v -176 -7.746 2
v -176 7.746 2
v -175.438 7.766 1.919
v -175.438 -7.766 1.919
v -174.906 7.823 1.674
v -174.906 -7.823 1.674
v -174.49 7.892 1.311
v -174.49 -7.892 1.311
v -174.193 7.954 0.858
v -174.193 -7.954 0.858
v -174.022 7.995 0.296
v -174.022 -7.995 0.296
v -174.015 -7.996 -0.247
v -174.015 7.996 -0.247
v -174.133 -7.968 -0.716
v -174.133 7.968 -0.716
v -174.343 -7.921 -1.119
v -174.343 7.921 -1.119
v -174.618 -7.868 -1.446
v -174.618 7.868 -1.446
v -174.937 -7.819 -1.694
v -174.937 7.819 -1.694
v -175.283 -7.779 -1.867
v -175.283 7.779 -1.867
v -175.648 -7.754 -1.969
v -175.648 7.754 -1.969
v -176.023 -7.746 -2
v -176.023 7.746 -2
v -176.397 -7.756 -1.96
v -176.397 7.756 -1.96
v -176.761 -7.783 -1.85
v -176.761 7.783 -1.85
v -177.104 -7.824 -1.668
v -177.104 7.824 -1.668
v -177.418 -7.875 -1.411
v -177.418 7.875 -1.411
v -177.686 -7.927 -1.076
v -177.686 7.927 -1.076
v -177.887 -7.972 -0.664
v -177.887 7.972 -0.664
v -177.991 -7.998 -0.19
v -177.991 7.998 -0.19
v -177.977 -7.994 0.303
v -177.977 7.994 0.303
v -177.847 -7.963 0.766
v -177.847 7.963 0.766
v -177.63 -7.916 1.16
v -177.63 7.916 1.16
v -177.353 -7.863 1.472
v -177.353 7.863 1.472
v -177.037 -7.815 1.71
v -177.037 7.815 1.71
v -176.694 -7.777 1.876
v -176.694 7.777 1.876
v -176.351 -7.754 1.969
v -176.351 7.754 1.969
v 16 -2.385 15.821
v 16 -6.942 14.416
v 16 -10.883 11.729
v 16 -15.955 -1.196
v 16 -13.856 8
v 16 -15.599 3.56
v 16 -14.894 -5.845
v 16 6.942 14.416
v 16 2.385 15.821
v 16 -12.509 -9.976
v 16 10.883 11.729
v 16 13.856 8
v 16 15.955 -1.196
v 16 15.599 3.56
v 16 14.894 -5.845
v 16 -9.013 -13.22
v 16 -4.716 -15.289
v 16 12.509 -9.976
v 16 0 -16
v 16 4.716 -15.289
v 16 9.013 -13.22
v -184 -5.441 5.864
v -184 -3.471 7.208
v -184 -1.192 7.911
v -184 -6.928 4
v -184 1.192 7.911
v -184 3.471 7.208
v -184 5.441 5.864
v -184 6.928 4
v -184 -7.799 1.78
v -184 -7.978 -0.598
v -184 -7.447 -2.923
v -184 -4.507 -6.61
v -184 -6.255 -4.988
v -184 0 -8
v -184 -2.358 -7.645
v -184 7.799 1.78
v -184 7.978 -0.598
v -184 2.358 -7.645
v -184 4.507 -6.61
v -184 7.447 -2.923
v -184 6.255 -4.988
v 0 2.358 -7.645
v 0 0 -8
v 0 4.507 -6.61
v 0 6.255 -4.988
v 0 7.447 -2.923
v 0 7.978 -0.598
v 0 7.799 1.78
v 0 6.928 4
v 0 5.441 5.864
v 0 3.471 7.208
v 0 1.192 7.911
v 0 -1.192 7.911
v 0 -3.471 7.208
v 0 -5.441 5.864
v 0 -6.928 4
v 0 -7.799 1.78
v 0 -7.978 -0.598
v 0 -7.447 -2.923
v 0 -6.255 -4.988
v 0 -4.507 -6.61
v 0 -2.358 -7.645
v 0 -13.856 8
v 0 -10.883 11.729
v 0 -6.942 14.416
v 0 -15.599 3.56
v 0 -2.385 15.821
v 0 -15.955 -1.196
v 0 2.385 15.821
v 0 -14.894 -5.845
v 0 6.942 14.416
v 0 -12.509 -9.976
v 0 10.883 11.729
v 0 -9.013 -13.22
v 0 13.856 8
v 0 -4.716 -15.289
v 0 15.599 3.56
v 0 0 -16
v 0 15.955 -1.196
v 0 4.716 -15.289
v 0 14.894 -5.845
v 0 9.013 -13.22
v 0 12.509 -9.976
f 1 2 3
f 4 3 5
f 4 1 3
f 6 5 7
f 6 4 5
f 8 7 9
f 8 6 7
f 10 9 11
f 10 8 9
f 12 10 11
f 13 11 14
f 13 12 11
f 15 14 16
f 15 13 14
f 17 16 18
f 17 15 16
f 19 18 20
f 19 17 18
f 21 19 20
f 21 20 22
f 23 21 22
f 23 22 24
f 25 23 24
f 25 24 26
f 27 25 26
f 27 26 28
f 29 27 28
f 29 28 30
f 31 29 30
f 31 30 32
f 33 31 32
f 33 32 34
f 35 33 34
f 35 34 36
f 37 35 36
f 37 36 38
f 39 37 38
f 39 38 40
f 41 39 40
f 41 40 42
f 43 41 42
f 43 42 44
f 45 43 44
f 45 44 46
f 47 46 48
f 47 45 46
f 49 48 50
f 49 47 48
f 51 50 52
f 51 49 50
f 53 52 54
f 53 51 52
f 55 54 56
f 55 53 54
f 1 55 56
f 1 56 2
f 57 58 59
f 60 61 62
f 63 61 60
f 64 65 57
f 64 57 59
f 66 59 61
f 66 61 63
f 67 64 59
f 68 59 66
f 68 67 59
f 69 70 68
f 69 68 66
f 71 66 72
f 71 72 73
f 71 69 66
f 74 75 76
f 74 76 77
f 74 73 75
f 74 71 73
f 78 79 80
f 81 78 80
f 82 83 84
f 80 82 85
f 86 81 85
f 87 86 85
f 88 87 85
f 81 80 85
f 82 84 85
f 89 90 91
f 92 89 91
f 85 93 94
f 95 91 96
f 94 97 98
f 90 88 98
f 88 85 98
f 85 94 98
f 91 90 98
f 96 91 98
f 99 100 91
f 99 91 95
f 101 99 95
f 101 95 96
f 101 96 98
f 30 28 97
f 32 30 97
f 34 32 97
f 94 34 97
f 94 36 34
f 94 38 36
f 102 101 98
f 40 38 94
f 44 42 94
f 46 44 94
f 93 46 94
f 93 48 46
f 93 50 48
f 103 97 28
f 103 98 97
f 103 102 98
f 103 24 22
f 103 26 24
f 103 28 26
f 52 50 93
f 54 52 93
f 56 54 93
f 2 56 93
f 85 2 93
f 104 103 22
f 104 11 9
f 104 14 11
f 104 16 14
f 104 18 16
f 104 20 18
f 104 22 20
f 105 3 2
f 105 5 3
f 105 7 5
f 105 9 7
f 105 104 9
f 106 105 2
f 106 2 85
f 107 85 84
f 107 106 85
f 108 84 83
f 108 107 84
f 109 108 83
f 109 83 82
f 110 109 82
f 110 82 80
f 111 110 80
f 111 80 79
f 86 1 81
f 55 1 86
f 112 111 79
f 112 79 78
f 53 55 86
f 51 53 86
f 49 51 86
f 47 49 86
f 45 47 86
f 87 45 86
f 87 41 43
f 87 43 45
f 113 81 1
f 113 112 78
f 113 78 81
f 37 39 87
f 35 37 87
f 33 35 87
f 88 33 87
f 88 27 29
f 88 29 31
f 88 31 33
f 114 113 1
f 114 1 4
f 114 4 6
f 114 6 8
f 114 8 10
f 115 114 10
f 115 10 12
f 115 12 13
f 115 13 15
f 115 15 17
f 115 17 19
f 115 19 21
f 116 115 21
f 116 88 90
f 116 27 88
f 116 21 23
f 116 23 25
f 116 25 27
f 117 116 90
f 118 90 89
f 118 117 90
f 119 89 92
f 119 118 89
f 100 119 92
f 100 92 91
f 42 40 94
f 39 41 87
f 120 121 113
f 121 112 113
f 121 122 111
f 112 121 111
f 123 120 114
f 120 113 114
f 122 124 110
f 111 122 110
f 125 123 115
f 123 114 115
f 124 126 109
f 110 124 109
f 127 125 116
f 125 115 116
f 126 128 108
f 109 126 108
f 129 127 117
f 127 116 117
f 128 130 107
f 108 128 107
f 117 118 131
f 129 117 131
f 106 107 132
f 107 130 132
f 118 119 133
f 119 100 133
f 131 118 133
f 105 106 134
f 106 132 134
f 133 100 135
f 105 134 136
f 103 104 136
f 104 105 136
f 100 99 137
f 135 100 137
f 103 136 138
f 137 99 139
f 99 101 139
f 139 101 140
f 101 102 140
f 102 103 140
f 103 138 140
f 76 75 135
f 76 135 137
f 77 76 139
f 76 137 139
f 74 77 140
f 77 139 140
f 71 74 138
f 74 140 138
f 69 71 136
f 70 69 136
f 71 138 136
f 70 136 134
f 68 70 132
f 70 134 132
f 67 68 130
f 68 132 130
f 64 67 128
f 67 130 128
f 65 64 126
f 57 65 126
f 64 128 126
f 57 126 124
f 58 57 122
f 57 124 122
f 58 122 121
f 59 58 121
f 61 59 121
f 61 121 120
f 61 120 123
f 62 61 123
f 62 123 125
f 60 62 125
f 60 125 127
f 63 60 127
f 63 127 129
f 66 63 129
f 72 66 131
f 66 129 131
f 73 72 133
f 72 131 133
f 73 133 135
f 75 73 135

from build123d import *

# Parameters (mm, degrees)
SKETCH1_R               = 16
BOSS_EXTRUDE1_DEPTH     = 16
SKETCH2_R               = 8
BOSS_EXTRUDE2_DEPTH     = 200
CUT_EXTRUDE2_DEPTH      = 186.38608362
CUT_EXTRUDE2_DEPTH_BACK = 186.38608362
SKETCH3_R               = 2


with BuildPart() as part:
    # Sketch1 → Boss-Extrude1 (new body)
    with BuildSketch(Plane(origin=(0, 0, 0), x_dir=(0, 0, -1), z_dir=(1, 0, 0))):
        Circle(SKETCH1_R)
    extrude(amount=BOSS_EXTRUDE1_DEPTH)

    # Sketch2 → Boss-Extrude2 (add)
    with BuildSketch(Plane(origin=(16, 0, 0), x_dir=(0, 0, -1), z_dir=(1, 0, 0))):
        Circle(SKETCH2_R)
    extrude(amount=-BOSS_EXTRUDE2_DEPTH)

    # Sketch3 → Cut-Extrude2 (cut, two sides: drawn at the far end of the back side and taken through both)
    with BuildSketch(Plane(origin=(0, 0, 0), x_dir=(1, 0, 0), z_dir=(0, 1, 0)).offset(-CUT_EXTRUDE2_DEPTH_BACK)):
        with Locations(Location((-176, 0, 0), (0, 0, 270))):
            Circle(SKETCH3_R)
    extrude(amount=CUT_EXTRUDE2_DEPTH + CUT_EXTRUDE2_DEPTH_BACK, mode=Mode.SUBTRACT)


solid = part.part
